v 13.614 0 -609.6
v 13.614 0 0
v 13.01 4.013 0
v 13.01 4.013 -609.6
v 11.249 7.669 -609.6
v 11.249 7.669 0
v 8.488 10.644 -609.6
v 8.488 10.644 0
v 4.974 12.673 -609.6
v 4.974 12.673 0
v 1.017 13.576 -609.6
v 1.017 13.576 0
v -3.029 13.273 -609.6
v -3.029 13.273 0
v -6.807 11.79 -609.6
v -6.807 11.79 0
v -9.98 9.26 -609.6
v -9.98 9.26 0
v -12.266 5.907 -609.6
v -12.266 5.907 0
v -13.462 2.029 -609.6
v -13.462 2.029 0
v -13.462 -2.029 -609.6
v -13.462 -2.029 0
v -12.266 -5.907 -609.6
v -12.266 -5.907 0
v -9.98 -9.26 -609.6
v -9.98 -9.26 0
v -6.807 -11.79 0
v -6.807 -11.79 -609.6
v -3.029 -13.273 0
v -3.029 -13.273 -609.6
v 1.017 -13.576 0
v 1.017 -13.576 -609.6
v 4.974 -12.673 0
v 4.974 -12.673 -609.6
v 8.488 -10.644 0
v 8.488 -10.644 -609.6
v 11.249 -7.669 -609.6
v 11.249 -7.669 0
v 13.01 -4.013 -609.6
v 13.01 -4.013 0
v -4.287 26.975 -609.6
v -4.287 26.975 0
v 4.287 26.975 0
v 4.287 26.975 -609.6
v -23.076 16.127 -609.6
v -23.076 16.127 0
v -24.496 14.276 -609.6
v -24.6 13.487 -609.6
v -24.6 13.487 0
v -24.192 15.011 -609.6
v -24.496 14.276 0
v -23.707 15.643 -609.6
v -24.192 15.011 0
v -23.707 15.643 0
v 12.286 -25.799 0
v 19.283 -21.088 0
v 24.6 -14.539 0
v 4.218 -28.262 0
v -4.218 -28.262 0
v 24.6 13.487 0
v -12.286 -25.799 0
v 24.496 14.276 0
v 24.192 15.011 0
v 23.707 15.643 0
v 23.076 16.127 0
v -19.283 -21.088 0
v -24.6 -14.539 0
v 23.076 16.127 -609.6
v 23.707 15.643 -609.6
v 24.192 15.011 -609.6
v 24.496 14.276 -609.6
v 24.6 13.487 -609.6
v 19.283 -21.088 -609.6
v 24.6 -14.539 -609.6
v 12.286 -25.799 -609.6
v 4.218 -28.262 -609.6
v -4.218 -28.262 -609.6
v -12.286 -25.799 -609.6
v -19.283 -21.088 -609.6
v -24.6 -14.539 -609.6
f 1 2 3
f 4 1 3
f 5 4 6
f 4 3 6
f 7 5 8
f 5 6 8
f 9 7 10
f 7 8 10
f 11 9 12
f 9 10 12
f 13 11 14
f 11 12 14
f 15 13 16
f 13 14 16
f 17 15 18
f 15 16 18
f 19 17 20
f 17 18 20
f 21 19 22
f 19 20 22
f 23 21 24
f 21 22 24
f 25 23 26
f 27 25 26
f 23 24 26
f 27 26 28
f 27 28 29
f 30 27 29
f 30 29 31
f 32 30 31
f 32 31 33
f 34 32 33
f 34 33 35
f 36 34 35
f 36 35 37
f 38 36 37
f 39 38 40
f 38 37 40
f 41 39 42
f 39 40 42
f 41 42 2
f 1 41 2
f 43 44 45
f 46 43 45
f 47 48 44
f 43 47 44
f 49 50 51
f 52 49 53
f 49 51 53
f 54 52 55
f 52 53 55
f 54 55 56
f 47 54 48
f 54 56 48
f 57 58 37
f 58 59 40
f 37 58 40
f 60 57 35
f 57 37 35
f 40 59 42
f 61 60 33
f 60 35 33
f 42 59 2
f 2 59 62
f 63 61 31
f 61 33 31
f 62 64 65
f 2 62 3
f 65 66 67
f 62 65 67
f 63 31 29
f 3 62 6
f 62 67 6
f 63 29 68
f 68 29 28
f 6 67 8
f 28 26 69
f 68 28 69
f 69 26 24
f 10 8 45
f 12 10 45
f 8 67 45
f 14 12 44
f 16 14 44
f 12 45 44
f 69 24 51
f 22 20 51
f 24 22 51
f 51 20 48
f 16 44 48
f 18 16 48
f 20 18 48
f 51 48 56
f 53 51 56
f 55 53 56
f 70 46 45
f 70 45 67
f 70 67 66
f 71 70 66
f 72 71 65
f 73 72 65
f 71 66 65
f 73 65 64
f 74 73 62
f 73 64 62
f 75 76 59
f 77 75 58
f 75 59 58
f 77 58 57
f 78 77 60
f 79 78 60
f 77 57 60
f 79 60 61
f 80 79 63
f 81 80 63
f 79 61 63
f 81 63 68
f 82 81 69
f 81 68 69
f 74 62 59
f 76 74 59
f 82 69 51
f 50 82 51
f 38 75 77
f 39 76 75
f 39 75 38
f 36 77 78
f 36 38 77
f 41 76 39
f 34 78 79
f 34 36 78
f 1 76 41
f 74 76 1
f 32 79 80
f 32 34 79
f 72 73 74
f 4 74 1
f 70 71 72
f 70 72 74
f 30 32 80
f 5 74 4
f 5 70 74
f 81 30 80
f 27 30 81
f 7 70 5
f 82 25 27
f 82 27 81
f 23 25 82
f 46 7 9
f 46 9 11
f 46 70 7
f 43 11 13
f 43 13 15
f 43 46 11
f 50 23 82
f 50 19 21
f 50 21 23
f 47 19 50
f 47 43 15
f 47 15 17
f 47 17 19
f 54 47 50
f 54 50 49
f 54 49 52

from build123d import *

# Parameters (mm, degrees)
SKETCH1_R      = 13.6144
EXTRUDE1_DEPTH = 609.6


with BuildPart() as part:
    # Sketch1 → Extrude1 (new body)
    with BuildSketch(Plane.XY):
        with BuildLine():
            Line((-4.287037938, 26.9748), (4.287037938, 26.9748))
            Line((4.287037938, 26.9748), (23.0759, 16.127045431))
            ThreePointArc((23.0759, 16.127045431), (24.191545431, 15.0114), (24.5999, 13.4874))
            Line((24.5999, 13.4874), (24.5999, -14.538760091))
            ThreePointArc((24.5999, -14.538760091), (0, -28.575), (-24.5999, -14.538760091))
            Line((-24.5999, -14.538760091), (-24.5999, 13.4874))
            ThreePointArc((-24.5999, 13.4874), (-24.191545431, 15.0114), (-23.0759, 16.127045431))
            Line((-23.0759, 16.127045431), (-4.287037938, 26.9748))
        make_face()
        Circle(SKETCH1_R, mode=Mode.SUBTRACT)
    extrude(amount=-EXTRUDE1_DEPTH)


solid = part.part
